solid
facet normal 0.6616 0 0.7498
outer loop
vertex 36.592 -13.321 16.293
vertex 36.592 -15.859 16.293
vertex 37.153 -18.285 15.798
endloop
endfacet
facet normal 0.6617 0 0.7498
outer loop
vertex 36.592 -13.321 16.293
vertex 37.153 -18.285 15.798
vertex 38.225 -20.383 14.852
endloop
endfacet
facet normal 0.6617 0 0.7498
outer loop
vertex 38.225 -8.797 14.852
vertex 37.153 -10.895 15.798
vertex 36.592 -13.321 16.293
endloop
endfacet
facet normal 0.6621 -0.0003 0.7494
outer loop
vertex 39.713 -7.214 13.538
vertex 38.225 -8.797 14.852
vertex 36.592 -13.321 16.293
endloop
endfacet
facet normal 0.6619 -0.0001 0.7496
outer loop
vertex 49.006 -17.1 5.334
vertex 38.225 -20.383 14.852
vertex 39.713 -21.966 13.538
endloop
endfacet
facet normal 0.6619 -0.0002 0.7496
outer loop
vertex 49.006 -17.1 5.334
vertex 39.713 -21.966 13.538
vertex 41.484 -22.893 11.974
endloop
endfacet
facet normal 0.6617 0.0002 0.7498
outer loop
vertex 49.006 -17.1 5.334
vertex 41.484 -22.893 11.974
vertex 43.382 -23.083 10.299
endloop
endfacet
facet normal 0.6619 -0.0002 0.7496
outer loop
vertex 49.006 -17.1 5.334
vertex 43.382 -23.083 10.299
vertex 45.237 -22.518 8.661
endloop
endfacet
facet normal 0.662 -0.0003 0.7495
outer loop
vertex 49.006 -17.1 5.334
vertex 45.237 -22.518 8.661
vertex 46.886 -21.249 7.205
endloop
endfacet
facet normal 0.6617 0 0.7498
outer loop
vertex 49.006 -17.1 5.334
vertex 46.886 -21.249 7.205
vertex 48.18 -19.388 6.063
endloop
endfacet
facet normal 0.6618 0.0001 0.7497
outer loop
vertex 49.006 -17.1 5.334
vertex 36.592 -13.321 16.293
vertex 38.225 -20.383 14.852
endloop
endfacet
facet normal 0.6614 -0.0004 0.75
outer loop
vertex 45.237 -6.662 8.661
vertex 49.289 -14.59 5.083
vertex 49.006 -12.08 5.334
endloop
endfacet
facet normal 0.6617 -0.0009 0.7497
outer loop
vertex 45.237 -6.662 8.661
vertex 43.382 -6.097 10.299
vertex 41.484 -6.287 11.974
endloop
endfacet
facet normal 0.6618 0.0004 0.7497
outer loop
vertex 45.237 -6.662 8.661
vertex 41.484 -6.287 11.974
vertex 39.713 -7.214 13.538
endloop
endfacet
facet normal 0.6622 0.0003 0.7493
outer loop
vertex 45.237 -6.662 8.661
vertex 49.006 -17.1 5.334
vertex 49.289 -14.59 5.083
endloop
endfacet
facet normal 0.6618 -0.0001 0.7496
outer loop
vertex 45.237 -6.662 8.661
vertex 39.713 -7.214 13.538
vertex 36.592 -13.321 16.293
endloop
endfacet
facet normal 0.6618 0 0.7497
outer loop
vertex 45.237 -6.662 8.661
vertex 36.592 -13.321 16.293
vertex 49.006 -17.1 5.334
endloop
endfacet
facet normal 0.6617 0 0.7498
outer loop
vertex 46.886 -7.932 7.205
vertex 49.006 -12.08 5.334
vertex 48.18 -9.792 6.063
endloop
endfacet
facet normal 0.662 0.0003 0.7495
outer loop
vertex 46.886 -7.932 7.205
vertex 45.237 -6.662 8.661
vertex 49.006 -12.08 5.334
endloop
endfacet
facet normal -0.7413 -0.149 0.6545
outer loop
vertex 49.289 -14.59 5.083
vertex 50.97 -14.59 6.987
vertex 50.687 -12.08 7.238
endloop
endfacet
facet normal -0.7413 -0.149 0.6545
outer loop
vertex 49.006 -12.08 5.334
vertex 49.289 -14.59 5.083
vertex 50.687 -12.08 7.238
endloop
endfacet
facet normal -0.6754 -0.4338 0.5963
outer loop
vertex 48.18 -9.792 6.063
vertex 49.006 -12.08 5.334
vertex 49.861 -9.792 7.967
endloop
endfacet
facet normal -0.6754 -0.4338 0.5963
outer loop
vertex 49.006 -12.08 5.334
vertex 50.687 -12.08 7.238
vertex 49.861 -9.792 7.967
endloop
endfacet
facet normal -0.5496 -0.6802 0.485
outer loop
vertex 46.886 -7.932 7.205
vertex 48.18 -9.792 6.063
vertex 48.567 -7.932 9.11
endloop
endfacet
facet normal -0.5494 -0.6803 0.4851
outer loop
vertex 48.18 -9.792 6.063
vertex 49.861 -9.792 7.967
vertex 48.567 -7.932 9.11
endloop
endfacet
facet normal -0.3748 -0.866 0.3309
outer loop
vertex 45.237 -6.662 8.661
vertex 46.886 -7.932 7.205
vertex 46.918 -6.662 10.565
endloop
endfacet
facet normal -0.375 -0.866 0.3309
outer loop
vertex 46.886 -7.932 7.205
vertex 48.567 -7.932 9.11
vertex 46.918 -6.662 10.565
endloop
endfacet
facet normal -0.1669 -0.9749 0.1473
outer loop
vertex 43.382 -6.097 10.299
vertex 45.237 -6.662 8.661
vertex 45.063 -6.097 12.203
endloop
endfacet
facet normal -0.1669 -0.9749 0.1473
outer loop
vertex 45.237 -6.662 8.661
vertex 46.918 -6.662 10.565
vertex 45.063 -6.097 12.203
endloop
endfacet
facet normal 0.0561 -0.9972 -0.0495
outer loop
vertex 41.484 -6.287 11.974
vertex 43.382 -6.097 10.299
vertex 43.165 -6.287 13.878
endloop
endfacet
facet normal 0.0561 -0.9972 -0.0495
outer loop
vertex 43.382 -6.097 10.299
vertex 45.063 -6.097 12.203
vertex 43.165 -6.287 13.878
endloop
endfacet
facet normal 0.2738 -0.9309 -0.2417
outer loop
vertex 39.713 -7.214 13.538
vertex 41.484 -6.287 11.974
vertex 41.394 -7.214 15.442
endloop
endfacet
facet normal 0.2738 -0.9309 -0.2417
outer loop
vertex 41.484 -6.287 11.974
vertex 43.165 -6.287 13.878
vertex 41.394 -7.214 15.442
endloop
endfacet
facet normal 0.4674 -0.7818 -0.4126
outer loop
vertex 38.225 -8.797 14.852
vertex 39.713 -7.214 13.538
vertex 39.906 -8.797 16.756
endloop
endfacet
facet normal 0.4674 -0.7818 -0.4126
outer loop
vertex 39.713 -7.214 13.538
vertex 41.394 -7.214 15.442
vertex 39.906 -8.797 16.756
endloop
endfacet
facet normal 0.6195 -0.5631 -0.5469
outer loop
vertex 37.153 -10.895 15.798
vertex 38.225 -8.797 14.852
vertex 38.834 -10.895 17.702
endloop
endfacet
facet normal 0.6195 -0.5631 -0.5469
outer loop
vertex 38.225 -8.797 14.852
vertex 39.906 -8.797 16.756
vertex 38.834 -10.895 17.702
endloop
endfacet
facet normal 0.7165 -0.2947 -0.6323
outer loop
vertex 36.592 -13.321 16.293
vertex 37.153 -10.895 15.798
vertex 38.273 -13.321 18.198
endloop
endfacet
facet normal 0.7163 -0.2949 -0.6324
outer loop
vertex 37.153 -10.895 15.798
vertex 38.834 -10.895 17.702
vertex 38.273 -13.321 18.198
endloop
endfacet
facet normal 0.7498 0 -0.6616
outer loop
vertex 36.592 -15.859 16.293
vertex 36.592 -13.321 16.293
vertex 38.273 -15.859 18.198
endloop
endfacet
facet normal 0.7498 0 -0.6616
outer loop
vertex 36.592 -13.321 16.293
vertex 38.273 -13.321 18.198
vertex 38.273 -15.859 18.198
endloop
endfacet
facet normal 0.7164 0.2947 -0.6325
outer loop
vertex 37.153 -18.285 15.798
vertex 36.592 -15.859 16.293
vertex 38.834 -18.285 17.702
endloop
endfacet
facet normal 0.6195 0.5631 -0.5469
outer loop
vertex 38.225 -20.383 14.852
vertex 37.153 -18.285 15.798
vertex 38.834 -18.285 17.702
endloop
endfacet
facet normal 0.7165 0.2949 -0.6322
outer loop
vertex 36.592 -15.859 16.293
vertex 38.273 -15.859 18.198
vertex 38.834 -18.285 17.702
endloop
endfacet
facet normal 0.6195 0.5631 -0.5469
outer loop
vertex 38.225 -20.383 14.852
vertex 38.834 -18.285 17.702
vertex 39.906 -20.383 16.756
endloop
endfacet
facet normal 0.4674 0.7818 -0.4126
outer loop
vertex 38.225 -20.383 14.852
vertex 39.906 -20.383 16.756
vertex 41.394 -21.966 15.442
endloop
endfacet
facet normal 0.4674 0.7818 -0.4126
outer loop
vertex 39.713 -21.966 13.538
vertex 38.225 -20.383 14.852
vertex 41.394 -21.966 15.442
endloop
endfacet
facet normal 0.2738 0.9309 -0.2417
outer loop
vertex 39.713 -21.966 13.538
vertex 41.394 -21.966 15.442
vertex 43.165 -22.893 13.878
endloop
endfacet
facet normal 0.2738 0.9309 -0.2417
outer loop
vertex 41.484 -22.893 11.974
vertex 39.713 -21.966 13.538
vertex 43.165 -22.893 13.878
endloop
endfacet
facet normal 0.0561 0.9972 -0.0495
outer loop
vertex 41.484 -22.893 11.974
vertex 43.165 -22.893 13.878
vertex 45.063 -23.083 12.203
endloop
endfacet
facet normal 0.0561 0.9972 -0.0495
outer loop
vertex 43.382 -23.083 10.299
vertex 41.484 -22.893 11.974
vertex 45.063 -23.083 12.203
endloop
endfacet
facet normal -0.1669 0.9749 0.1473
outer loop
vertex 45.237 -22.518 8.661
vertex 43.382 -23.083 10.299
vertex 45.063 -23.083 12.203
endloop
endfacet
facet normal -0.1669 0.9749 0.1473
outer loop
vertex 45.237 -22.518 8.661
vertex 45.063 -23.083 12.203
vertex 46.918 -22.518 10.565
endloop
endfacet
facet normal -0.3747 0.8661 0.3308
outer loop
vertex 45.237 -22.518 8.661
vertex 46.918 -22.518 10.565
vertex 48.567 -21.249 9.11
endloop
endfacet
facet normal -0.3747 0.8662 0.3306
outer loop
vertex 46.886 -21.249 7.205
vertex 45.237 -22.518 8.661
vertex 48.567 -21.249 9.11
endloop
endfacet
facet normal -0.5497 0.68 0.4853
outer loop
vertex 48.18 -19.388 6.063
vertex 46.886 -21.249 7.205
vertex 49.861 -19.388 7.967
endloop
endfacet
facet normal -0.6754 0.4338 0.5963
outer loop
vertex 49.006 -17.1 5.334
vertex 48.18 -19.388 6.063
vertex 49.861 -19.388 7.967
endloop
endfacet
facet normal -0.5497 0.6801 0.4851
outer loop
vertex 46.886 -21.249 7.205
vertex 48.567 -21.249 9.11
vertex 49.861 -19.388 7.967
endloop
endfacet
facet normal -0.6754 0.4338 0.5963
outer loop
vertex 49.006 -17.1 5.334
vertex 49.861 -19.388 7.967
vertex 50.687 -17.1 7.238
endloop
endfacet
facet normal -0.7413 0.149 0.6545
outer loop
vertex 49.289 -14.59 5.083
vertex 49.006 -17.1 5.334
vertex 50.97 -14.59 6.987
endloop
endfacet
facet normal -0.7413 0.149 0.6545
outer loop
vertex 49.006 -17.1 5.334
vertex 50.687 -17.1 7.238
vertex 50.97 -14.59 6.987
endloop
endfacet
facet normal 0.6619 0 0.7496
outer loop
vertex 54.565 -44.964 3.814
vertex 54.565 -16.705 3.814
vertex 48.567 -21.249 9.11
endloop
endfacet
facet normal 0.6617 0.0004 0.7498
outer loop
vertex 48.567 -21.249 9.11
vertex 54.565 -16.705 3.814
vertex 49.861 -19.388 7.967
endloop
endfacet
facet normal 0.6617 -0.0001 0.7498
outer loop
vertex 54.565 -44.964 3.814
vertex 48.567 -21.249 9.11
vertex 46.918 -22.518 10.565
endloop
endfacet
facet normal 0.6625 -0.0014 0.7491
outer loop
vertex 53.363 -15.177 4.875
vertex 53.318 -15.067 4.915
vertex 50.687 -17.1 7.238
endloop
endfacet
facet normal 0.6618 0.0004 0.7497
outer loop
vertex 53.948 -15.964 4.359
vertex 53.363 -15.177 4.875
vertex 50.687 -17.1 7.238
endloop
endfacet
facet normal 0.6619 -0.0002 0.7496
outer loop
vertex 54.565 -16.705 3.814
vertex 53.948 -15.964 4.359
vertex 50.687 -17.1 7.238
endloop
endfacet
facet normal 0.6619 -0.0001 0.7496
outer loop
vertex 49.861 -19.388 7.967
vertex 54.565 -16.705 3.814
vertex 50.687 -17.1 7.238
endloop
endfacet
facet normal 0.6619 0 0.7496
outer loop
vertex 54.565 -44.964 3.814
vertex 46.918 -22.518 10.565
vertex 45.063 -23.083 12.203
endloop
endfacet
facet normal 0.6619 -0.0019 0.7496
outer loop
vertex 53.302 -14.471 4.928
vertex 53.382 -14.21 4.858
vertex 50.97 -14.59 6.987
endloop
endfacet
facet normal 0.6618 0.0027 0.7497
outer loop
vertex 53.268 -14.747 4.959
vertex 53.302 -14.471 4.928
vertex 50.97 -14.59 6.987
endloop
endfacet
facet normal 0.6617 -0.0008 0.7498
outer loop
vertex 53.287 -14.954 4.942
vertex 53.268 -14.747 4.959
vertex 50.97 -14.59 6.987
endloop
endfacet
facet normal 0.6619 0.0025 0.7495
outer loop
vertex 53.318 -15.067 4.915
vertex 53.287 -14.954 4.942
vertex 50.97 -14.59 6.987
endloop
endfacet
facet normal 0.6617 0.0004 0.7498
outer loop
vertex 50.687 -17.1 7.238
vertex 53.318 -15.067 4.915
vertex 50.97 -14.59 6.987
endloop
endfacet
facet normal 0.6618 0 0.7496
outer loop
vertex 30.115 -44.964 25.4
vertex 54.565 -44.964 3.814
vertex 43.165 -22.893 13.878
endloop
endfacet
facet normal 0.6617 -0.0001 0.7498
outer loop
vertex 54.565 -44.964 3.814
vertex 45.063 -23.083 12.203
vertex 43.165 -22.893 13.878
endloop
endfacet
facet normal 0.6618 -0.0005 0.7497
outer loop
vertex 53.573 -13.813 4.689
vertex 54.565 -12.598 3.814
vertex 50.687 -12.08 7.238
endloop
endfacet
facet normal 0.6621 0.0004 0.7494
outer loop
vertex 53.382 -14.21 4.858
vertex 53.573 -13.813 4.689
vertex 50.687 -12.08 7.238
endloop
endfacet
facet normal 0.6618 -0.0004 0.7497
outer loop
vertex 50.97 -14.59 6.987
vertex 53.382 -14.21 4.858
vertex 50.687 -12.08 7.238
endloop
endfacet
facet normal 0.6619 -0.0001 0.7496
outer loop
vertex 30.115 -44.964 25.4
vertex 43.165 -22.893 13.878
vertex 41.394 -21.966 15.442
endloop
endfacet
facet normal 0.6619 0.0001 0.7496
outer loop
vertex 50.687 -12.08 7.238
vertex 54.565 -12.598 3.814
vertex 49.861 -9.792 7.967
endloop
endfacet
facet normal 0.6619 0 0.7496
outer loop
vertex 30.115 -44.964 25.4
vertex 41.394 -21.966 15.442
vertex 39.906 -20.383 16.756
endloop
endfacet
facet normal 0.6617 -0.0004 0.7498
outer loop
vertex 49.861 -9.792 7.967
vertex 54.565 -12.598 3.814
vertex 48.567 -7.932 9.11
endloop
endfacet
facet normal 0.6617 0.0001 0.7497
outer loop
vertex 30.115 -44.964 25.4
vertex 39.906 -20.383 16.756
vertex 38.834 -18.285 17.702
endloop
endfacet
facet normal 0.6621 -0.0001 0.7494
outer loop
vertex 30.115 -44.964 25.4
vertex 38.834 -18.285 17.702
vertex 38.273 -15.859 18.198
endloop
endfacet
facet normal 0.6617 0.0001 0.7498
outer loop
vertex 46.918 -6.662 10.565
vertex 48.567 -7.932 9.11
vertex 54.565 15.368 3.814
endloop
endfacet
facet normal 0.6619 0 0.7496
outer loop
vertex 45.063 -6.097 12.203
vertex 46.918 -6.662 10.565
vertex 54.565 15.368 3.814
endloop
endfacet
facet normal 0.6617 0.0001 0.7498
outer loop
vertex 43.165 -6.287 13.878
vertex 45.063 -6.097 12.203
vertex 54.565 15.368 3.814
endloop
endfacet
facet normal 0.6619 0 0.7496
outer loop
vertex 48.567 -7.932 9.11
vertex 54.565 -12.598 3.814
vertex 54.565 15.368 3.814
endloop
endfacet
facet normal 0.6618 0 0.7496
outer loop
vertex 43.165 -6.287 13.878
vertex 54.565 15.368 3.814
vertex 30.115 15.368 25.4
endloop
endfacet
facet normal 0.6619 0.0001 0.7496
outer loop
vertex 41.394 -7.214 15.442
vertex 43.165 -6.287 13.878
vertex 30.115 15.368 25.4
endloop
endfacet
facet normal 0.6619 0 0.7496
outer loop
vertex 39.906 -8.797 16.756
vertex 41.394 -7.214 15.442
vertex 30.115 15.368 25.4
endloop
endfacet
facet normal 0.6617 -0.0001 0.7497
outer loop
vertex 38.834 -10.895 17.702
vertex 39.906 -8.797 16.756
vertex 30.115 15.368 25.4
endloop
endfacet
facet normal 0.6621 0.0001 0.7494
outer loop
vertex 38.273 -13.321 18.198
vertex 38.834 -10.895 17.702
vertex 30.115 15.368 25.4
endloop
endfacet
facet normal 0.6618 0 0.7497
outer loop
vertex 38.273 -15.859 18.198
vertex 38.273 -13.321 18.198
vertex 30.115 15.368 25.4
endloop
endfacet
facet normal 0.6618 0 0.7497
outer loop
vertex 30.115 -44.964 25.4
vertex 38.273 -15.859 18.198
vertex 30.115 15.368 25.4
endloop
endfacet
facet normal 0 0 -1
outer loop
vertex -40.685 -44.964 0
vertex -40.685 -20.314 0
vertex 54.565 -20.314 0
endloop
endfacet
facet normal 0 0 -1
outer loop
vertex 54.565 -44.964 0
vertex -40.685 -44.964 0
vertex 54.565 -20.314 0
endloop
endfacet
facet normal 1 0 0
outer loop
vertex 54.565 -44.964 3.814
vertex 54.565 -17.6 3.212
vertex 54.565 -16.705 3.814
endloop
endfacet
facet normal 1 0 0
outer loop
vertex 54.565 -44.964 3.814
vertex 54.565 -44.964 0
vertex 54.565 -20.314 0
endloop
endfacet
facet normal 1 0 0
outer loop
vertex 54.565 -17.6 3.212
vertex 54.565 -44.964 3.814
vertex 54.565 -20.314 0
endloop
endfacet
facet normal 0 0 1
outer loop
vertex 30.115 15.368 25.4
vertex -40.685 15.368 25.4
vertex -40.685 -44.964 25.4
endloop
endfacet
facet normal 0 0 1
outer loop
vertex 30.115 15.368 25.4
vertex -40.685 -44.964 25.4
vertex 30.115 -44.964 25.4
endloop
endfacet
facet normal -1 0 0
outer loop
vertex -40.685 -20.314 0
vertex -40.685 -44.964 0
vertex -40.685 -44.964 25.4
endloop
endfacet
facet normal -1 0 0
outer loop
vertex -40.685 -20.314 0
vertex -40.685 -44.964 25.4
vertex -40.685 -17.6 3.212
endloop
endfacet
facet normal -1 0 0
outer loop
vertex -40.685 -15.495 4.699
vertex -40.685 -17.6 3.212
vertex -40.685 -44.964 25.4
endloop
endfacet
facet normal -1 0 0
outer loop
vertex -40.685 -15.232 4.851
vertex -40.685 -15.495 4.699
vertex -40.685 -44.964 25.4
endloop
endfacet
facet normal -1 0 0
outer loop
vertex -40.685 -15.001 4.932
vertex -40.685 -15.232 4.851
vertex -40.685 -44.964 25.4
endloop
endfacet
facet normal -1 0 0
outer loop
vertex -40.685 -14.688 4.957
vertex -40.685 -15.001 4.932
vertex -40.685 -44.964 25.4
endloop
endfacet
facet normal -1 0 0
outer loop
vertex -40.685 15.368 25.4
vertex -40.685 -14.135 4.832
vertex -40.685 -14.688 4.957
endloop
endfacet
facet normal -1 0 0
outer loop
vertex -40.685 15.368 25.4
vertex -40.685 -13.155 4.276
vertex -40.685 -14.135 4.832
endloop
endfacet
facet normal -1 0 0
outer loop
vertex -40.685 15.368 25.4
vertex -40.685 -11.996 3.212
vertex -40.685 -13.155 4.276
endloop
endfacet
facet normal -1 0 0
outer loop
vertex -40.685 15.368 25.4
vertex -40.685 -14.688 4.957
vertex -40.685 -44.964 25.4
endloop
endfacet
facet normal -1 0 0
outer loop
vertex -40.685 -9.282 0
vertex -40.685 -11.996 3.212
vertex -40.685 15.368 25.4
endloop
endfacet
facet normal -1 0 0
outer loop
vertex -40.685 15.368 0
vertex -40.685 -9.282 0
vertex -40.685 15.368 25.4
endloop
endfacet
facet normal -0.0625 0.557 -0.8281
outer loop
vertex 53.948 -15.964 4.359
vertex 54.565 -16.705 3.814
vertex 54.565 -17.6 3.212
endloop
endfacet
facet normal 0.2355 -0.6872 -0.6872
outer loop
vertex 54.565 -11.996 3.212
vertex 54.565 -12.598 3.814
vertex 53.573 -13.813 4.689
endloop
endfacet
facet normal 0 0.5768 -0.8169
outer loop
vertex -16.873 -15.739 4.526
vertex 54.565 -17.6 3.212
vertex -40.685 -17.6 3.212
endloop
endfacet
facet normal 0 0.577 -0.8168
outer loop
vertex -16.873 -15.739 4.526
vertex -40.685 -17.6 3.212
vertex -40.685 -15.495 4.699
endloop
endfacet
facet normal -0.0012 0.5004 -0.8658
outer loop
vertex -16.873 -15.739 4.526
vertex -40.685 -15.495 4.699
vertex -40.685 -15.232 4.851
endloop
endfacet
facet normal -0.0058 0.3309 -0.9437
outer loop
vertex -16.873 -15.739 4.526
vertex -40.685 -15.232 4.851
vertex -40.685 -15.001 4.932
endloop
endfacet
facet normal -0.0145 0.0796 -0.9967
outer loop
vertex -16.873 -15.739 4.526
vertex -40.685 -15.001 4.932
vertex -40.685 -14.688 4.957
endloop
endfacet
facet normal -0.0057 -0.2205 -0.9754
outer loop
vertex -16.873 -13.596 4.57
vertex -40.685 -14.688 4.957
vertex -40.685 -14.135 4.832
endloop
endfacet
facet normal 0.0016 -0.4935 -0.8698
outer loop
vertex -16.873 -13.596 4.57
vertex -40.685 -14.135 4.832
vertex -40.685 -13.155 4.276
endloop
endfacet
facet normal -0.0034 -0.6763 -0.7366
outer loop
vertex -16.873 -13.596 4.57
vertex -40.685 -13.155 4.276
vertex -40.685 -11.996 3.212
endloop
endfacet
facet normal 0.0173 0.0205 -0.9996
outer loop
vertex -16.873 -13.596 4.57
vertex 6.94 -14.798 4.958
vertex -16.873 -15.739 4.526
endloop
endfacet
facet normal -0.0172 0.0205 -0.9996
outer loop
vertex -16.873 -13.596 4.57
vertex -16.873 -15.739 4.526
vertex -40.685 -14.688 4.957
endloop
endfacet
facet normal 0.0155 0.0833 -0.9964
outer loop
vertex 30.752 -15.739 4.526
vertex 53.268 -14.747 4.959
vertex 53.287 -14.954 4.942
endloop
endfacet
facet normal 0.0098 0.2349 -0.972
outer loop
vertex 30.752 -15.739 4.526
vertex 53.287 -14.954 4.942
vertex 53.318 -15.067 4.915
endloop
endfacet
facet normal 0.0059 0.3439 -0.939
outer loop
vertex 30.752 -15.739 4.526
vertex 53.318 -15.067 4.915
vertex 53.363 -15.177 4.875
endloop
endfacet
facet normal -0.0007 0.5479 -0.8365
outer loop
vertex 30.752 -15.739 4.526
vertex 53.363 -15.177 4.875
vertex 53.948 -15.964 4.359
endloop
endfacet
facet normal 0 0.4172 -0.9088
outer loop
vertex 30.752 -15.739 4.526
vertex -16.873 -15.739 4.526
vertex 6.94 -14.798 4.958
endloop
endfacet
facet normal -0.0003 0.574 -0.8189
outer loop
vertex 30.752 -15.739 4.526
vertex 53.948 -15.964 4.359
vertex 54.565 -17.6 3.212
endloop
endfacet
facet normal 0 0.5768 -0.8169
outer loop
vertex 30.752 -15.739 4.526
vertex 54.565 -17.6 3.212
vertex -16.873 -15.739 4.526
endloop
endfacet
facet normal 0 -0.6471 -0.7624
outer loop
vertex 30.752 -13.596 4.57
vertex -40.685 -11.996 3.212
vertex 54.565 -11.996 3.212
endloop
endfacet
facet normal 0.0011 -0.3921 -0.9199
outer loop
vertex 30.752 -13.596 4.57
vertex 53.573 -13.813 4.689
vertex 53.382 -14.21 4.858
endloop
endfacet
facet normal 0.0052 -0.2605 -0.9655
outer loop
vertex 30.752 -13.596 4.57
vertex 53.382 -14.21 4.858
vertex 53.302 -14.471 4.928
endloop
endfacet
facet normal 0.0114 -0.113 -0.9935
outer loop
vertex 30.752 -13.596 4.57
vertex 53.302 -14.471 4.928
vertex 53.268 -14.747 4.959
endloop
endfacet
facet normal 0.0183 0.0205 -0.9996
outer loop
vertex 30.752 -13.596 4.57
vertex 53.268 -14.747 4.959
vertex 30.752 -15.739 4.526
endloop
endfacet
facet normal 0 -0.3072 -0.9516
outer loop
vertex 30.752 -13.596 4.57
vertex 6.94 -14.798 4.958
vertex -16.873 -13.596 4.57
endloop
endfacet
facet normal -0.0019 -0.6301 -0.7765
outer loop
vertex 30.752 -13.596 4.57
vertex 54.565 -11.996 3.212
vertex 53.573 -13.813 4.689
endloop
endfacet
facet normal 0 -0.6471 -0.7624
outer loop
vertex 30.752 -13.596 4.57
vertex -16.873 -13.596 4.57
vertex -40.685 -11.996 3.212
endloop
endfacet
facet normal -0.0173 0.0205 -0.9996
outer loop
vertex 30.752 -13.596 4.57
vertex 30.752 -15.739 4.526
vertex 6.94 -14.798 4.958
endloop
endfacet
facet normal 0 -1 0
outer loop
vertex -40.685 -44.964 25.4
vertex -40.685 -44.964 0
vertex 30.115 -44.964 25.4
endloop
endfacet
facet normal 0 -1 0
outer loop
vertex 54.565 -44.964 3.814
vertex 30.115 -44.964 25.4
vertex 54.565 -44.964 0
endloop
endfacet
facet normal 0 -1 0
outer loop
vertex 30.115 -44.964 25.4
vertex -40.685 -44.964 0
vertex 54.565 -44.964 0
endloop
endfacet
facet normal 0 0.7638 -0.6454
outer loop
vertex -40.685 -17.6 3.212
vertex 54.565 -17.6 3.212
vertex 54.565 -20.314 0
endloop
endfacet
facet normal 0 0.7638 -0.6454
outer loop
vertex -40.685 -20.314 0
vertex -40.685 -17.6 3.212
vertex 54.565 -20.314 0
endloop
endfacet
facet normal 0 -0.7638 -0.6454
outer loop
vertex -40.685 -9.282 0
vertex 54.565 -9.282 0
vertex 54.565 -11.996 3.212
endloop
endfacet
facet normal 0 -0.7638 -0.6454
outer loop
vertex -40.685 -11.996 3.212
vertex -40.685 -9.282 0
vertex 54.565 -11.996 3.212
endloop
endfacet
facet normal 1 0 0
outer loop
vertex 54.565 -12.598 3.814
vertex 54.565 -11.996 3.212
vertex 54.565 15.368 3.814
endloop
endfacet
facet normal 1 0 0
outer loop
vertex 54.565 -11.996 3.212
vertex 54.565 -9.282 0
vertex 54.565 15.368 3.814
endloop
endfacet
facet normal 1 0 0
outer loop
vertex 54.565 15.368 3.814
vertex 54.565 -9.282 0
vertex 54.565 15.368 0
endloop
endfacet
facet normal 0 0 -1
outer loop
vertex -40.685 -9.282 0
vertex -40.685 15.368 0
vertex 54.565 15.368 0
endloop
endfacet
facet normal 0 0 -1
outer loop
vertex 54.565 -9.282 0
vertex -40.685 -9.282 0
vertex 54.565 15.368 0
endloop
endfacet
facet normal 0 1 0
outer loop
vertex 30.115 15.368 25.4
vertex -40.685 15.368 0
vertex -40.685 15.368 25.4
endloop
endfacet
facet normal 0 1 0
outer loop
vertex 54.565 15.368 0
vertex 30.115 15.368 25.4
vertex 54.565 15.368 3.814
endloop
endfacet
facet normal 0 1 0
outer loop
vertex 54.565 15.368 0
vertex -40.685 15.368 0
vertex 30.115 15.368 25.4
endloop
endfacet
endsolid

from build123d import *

# Parameters (mm, degrees)
F0_W     = 95.25
F0_H     = 60.3318884472
F1_DEPTH = 25.4
F3_DEPTH = 95.25
F5_DEPTH = 95.25
F6_R     = 8.5166000229
F7_DEPTH = 2.54


with BuildPart() as f1:
    # F0 (on Top) → F1 (new body)
    with BuildSketch(Plane.XY):
        with Locations((6.9396421313, -14.7977671586)):
            Rectangle(F0_W, F0_H)
    extrude(amount=F1_DEPTH)

    # F2 (on face) → F3 (cut)
    with BuildSketch(Plane.YZ.offset(54.5646421313)):
        with BuildLine():
            Line((-17.5997193688, 3.2119287359), (-20.3140247613, 0))
            Line((-20.3140247613, 0), (-14.7977671586, 0))
            Line((-14.7977671586, 0), (-9.2815095559, 0))
            Line((-9.2815095559, 0), (-11.9958061003, 3.2119362131))
            add(Edge.make_bspline(
                [(-17.5997193688, 3.2119287359), (-15.7335996163, 4.4085908758), (-15.1440525404, 5.4683826364), (-13.1693625568, 4.4868656847), (-11.9958061003, 3.2119362131)],
                knots=[0, 0, 0, 0, 0.4999998654, 1, 1, 1, 1], degree=3))
        make_face()
    extrude(amount=-F3_DEPTH, mode=Mode.SUBTRACT)

    # F4 (on face) → F5 (cut)
    with BuildSketch(Plane(origin=(0, 15.368177065, 0), x_dir=(-1, 0, 0), z_dir=(0, 1, 0))):
        Polygon((-60.7218779624, 31.5345525742), (-58.8849112391, 0), (-23.1661610305, 31.5345525742), align=None)
    extrude(amount=-F5_DEPTH, mode=Mode.SUBTRACT)

    # F6 (on face) → F7 (cut)
    with BuildSketch(Plane(origin=(25.7930277101, 0, 29.2154046497), x_dir=(0.7496503208, 0, -0.6618341156), z_dir=(0.6618341156, 0, 0.7496503208))):
        with Locations((25.0689592212, -14.590062201)):
            Circle(F6_R)
    extrude(amount=-F7_DEPTH, mode=Mode.SUBTRACT)


solid = f1.part
